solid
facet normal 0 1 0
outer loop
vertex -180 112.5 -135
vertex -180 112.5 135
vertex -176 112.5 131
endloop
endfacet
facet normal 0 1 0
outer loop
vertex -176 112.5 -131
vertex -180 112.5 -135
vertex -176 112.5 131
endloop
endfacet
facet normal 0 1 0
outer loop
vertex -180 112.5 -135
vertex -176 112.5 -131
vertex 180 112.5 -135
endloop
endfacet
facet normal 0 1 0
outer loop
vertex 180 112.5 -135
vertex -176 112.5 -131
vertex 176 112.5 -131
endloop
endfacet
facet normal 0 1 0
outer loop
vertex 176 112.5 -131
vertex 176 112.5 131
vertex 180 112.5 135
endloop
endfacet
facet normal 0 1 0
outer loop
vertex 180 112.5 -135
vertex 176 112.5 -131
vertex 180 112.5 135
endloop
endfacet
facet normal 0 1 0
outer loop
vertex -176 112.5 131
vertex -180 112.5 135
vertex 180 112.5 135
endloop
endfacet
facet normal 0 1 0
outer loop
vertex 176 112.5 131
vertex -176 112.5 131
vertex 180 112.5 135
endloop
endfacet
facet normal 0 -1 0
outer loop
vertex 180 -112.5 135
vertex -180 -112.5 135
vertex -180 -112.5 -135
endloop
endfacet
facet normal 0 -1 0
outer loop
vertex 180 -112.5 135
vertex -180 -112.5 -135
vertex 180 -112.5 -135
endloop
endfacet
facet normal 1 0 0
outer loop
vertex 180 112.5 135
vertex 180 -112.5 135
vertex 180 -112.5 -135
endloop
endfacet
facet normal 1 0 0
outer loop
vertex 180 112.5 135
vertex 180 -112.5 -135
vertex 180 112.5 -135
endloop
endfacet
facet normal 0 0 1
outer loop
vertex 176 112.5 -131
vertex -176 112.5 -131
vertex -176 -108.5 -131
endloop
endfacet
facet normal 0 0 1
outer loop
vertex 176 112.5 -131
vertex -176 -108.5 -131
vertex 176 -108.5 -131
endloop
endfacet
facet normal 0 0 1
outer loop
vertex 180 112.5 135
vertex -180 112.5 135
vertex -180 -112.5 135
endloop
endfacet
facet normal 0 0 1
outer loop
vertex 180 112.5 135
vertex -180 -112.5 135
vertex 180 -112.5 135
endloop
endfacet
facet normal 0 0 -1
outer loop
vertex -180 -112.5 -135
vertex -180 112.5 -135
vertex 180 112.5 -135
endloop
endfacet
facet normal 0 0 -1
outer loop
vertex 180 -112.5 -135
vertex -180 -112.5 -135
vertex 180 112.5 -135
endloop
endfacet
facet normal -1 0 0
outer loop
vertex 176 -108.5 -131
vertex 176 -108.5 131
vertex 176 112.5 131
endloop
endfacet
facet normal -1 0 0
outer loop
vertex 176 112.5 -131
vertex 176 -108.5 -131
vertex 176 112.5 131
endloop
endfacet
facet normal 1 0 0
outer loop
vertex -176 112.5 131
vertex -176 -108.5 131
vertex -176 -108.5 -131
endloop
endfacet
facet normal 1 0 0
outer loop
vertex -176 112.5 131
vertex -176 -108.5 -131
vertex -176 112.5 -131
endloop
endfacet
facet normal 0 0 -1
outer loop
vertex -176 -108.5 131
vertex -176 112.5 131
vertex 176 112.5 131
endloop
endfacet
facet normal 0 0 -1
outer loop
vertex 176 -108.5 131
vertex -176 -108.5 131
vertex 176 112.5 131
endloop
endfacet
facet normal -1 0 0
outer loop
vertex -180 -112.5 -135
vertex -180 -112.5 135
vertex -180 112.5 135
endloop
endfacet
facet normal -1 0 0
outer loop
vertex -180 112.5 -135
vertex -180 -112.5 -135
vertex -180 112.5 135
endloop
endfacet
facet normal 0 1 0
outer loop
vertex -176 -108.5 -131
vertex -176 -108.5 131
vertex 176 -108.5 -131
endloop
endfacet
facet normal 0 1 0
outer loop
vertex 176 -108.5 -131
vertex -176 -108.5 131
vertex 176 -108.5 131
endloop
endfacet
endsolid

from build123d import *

# Parameters (mm, degrees)
SALIENTE_EXTRUIR1_DEPTH      = 135
SALIENTE_EXTRUIR1_DEPTH_BACK = 135
CROQUIS1_W                   = 360
CROQUIS1_H                   = 225
VACIADO1_T                   = -4


with BuildPart() as part:
    # Croquis1 → Saliente-Extruir1 (new, two sides: drawn at the far end of the back side and taken through both)
    with BuildSketch(Plane.XY.offset(-SALIENTE_EXTRUIR1_DEPTH_BACK)):
        Rectangle(CROQUIS1_W, CROQUIS1_H)
    extrude(amount=SALIENTE_EXTRUIR1_DEPTH + SALIENTE_EXTRUIR1_DEPTH_BACK)

    # Vaciado1
    vaciado1_openings = [part.faces().sort_by_distance(p)[0] for p in [
        (0, 112.5, 0),
    ]]
    offset(amount=VACIADO1_T, openings=vaciado1_openings, kind=Kind.INTERSECTION)


solid = part.part
